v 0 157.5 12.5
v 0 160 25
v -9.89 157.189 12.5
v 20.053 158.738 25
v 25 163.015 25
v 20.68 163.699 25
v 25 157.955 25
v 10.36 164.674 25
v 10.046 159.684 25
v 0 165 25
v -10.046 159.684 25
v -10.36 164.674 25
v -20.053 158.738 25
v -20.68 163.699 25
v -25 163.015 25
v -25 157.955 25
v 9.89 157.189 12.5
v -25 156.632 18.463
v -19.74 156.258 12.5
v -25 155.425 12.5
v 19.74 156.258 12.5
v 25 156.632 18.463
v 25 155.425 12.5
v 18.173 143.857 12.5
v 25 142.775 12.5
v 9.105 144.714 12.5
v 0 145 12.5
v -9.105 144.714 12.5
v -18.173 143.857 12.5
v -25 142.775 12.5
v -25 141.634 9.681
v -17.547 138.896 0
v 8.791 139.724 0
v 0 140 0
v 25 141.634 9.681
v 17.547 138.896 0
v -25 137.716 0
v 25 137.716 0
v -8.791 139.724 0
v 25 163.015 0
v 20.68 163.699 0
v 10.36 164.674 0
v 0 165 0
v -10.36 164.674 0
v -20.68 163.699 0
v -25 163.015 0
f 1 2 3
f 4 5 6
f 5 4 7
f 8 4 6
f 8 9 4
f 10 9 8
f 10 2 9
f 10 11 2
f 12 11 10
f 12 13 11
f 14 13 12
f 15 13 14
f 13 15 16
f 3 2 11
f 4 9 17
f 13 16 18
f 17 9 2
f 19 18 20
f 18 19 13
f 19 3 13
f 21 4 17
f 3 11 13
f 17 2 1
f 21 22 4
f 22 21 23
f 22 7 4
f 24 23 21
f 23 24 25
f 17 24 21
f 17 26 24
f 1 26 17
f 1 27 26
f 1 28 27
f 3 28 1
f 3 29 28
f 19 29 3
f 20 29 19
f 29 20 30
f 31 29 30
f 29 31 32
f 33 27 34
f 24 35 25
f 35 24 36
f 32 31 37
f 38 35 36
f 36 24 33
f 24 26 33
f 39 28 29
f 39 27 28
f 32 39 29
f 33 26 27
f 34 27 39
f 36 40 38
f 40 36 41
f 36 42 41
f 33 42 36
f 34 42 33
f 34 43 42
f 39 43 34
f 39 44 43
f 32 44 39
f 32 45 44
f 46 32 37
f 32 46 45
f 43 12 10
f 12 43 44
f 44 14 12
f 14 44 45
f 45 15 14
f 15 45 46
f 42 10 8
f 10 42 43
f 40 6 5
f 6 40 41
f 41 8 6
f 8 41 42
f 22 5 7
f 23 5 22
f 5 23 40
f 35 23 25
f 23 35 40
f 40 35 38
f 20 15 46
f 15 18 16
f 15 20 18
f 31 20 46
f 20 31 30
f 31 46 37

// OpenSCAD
INNER_DIA_TOP_1 = 320;
INNER_DIA_TOP_2 = 315;
INNER_DIA_BOT_1 = 290;
INNER_DIA_BOT_2 = 280;
INNER_DEPTH = 25;
OUTER_DIA = 330;
OUTER_DEPTH = INNER_DEPTH;

WIDTH = 50;

$fn = 100;

module holder() {
  intersection() {
    difference() {
      cylinder(d = OUTER_DIA, h = OUTER_DEPTH);

      #union() {
        translate([0, 0, INNER_DEPTH/2])
        cylinder(d2 = INNER_DIA_TOP_1, d1 = INNER_DIA_TOP_2, h = INNER_DEPTH/2);
        cylinder(d2 = INNER_DIA_BOT_1, d1 = INNER_DIA_BOT_2, h = INNER_DEPTH/2);
      }
    }

    translate([-WIDTH/2, 0, 0])
    cube(size = [WIDTH, OUTER_DIA, max(INNER_DEPTH, OUTER_DEPTH)]);
  }
}

holder();
